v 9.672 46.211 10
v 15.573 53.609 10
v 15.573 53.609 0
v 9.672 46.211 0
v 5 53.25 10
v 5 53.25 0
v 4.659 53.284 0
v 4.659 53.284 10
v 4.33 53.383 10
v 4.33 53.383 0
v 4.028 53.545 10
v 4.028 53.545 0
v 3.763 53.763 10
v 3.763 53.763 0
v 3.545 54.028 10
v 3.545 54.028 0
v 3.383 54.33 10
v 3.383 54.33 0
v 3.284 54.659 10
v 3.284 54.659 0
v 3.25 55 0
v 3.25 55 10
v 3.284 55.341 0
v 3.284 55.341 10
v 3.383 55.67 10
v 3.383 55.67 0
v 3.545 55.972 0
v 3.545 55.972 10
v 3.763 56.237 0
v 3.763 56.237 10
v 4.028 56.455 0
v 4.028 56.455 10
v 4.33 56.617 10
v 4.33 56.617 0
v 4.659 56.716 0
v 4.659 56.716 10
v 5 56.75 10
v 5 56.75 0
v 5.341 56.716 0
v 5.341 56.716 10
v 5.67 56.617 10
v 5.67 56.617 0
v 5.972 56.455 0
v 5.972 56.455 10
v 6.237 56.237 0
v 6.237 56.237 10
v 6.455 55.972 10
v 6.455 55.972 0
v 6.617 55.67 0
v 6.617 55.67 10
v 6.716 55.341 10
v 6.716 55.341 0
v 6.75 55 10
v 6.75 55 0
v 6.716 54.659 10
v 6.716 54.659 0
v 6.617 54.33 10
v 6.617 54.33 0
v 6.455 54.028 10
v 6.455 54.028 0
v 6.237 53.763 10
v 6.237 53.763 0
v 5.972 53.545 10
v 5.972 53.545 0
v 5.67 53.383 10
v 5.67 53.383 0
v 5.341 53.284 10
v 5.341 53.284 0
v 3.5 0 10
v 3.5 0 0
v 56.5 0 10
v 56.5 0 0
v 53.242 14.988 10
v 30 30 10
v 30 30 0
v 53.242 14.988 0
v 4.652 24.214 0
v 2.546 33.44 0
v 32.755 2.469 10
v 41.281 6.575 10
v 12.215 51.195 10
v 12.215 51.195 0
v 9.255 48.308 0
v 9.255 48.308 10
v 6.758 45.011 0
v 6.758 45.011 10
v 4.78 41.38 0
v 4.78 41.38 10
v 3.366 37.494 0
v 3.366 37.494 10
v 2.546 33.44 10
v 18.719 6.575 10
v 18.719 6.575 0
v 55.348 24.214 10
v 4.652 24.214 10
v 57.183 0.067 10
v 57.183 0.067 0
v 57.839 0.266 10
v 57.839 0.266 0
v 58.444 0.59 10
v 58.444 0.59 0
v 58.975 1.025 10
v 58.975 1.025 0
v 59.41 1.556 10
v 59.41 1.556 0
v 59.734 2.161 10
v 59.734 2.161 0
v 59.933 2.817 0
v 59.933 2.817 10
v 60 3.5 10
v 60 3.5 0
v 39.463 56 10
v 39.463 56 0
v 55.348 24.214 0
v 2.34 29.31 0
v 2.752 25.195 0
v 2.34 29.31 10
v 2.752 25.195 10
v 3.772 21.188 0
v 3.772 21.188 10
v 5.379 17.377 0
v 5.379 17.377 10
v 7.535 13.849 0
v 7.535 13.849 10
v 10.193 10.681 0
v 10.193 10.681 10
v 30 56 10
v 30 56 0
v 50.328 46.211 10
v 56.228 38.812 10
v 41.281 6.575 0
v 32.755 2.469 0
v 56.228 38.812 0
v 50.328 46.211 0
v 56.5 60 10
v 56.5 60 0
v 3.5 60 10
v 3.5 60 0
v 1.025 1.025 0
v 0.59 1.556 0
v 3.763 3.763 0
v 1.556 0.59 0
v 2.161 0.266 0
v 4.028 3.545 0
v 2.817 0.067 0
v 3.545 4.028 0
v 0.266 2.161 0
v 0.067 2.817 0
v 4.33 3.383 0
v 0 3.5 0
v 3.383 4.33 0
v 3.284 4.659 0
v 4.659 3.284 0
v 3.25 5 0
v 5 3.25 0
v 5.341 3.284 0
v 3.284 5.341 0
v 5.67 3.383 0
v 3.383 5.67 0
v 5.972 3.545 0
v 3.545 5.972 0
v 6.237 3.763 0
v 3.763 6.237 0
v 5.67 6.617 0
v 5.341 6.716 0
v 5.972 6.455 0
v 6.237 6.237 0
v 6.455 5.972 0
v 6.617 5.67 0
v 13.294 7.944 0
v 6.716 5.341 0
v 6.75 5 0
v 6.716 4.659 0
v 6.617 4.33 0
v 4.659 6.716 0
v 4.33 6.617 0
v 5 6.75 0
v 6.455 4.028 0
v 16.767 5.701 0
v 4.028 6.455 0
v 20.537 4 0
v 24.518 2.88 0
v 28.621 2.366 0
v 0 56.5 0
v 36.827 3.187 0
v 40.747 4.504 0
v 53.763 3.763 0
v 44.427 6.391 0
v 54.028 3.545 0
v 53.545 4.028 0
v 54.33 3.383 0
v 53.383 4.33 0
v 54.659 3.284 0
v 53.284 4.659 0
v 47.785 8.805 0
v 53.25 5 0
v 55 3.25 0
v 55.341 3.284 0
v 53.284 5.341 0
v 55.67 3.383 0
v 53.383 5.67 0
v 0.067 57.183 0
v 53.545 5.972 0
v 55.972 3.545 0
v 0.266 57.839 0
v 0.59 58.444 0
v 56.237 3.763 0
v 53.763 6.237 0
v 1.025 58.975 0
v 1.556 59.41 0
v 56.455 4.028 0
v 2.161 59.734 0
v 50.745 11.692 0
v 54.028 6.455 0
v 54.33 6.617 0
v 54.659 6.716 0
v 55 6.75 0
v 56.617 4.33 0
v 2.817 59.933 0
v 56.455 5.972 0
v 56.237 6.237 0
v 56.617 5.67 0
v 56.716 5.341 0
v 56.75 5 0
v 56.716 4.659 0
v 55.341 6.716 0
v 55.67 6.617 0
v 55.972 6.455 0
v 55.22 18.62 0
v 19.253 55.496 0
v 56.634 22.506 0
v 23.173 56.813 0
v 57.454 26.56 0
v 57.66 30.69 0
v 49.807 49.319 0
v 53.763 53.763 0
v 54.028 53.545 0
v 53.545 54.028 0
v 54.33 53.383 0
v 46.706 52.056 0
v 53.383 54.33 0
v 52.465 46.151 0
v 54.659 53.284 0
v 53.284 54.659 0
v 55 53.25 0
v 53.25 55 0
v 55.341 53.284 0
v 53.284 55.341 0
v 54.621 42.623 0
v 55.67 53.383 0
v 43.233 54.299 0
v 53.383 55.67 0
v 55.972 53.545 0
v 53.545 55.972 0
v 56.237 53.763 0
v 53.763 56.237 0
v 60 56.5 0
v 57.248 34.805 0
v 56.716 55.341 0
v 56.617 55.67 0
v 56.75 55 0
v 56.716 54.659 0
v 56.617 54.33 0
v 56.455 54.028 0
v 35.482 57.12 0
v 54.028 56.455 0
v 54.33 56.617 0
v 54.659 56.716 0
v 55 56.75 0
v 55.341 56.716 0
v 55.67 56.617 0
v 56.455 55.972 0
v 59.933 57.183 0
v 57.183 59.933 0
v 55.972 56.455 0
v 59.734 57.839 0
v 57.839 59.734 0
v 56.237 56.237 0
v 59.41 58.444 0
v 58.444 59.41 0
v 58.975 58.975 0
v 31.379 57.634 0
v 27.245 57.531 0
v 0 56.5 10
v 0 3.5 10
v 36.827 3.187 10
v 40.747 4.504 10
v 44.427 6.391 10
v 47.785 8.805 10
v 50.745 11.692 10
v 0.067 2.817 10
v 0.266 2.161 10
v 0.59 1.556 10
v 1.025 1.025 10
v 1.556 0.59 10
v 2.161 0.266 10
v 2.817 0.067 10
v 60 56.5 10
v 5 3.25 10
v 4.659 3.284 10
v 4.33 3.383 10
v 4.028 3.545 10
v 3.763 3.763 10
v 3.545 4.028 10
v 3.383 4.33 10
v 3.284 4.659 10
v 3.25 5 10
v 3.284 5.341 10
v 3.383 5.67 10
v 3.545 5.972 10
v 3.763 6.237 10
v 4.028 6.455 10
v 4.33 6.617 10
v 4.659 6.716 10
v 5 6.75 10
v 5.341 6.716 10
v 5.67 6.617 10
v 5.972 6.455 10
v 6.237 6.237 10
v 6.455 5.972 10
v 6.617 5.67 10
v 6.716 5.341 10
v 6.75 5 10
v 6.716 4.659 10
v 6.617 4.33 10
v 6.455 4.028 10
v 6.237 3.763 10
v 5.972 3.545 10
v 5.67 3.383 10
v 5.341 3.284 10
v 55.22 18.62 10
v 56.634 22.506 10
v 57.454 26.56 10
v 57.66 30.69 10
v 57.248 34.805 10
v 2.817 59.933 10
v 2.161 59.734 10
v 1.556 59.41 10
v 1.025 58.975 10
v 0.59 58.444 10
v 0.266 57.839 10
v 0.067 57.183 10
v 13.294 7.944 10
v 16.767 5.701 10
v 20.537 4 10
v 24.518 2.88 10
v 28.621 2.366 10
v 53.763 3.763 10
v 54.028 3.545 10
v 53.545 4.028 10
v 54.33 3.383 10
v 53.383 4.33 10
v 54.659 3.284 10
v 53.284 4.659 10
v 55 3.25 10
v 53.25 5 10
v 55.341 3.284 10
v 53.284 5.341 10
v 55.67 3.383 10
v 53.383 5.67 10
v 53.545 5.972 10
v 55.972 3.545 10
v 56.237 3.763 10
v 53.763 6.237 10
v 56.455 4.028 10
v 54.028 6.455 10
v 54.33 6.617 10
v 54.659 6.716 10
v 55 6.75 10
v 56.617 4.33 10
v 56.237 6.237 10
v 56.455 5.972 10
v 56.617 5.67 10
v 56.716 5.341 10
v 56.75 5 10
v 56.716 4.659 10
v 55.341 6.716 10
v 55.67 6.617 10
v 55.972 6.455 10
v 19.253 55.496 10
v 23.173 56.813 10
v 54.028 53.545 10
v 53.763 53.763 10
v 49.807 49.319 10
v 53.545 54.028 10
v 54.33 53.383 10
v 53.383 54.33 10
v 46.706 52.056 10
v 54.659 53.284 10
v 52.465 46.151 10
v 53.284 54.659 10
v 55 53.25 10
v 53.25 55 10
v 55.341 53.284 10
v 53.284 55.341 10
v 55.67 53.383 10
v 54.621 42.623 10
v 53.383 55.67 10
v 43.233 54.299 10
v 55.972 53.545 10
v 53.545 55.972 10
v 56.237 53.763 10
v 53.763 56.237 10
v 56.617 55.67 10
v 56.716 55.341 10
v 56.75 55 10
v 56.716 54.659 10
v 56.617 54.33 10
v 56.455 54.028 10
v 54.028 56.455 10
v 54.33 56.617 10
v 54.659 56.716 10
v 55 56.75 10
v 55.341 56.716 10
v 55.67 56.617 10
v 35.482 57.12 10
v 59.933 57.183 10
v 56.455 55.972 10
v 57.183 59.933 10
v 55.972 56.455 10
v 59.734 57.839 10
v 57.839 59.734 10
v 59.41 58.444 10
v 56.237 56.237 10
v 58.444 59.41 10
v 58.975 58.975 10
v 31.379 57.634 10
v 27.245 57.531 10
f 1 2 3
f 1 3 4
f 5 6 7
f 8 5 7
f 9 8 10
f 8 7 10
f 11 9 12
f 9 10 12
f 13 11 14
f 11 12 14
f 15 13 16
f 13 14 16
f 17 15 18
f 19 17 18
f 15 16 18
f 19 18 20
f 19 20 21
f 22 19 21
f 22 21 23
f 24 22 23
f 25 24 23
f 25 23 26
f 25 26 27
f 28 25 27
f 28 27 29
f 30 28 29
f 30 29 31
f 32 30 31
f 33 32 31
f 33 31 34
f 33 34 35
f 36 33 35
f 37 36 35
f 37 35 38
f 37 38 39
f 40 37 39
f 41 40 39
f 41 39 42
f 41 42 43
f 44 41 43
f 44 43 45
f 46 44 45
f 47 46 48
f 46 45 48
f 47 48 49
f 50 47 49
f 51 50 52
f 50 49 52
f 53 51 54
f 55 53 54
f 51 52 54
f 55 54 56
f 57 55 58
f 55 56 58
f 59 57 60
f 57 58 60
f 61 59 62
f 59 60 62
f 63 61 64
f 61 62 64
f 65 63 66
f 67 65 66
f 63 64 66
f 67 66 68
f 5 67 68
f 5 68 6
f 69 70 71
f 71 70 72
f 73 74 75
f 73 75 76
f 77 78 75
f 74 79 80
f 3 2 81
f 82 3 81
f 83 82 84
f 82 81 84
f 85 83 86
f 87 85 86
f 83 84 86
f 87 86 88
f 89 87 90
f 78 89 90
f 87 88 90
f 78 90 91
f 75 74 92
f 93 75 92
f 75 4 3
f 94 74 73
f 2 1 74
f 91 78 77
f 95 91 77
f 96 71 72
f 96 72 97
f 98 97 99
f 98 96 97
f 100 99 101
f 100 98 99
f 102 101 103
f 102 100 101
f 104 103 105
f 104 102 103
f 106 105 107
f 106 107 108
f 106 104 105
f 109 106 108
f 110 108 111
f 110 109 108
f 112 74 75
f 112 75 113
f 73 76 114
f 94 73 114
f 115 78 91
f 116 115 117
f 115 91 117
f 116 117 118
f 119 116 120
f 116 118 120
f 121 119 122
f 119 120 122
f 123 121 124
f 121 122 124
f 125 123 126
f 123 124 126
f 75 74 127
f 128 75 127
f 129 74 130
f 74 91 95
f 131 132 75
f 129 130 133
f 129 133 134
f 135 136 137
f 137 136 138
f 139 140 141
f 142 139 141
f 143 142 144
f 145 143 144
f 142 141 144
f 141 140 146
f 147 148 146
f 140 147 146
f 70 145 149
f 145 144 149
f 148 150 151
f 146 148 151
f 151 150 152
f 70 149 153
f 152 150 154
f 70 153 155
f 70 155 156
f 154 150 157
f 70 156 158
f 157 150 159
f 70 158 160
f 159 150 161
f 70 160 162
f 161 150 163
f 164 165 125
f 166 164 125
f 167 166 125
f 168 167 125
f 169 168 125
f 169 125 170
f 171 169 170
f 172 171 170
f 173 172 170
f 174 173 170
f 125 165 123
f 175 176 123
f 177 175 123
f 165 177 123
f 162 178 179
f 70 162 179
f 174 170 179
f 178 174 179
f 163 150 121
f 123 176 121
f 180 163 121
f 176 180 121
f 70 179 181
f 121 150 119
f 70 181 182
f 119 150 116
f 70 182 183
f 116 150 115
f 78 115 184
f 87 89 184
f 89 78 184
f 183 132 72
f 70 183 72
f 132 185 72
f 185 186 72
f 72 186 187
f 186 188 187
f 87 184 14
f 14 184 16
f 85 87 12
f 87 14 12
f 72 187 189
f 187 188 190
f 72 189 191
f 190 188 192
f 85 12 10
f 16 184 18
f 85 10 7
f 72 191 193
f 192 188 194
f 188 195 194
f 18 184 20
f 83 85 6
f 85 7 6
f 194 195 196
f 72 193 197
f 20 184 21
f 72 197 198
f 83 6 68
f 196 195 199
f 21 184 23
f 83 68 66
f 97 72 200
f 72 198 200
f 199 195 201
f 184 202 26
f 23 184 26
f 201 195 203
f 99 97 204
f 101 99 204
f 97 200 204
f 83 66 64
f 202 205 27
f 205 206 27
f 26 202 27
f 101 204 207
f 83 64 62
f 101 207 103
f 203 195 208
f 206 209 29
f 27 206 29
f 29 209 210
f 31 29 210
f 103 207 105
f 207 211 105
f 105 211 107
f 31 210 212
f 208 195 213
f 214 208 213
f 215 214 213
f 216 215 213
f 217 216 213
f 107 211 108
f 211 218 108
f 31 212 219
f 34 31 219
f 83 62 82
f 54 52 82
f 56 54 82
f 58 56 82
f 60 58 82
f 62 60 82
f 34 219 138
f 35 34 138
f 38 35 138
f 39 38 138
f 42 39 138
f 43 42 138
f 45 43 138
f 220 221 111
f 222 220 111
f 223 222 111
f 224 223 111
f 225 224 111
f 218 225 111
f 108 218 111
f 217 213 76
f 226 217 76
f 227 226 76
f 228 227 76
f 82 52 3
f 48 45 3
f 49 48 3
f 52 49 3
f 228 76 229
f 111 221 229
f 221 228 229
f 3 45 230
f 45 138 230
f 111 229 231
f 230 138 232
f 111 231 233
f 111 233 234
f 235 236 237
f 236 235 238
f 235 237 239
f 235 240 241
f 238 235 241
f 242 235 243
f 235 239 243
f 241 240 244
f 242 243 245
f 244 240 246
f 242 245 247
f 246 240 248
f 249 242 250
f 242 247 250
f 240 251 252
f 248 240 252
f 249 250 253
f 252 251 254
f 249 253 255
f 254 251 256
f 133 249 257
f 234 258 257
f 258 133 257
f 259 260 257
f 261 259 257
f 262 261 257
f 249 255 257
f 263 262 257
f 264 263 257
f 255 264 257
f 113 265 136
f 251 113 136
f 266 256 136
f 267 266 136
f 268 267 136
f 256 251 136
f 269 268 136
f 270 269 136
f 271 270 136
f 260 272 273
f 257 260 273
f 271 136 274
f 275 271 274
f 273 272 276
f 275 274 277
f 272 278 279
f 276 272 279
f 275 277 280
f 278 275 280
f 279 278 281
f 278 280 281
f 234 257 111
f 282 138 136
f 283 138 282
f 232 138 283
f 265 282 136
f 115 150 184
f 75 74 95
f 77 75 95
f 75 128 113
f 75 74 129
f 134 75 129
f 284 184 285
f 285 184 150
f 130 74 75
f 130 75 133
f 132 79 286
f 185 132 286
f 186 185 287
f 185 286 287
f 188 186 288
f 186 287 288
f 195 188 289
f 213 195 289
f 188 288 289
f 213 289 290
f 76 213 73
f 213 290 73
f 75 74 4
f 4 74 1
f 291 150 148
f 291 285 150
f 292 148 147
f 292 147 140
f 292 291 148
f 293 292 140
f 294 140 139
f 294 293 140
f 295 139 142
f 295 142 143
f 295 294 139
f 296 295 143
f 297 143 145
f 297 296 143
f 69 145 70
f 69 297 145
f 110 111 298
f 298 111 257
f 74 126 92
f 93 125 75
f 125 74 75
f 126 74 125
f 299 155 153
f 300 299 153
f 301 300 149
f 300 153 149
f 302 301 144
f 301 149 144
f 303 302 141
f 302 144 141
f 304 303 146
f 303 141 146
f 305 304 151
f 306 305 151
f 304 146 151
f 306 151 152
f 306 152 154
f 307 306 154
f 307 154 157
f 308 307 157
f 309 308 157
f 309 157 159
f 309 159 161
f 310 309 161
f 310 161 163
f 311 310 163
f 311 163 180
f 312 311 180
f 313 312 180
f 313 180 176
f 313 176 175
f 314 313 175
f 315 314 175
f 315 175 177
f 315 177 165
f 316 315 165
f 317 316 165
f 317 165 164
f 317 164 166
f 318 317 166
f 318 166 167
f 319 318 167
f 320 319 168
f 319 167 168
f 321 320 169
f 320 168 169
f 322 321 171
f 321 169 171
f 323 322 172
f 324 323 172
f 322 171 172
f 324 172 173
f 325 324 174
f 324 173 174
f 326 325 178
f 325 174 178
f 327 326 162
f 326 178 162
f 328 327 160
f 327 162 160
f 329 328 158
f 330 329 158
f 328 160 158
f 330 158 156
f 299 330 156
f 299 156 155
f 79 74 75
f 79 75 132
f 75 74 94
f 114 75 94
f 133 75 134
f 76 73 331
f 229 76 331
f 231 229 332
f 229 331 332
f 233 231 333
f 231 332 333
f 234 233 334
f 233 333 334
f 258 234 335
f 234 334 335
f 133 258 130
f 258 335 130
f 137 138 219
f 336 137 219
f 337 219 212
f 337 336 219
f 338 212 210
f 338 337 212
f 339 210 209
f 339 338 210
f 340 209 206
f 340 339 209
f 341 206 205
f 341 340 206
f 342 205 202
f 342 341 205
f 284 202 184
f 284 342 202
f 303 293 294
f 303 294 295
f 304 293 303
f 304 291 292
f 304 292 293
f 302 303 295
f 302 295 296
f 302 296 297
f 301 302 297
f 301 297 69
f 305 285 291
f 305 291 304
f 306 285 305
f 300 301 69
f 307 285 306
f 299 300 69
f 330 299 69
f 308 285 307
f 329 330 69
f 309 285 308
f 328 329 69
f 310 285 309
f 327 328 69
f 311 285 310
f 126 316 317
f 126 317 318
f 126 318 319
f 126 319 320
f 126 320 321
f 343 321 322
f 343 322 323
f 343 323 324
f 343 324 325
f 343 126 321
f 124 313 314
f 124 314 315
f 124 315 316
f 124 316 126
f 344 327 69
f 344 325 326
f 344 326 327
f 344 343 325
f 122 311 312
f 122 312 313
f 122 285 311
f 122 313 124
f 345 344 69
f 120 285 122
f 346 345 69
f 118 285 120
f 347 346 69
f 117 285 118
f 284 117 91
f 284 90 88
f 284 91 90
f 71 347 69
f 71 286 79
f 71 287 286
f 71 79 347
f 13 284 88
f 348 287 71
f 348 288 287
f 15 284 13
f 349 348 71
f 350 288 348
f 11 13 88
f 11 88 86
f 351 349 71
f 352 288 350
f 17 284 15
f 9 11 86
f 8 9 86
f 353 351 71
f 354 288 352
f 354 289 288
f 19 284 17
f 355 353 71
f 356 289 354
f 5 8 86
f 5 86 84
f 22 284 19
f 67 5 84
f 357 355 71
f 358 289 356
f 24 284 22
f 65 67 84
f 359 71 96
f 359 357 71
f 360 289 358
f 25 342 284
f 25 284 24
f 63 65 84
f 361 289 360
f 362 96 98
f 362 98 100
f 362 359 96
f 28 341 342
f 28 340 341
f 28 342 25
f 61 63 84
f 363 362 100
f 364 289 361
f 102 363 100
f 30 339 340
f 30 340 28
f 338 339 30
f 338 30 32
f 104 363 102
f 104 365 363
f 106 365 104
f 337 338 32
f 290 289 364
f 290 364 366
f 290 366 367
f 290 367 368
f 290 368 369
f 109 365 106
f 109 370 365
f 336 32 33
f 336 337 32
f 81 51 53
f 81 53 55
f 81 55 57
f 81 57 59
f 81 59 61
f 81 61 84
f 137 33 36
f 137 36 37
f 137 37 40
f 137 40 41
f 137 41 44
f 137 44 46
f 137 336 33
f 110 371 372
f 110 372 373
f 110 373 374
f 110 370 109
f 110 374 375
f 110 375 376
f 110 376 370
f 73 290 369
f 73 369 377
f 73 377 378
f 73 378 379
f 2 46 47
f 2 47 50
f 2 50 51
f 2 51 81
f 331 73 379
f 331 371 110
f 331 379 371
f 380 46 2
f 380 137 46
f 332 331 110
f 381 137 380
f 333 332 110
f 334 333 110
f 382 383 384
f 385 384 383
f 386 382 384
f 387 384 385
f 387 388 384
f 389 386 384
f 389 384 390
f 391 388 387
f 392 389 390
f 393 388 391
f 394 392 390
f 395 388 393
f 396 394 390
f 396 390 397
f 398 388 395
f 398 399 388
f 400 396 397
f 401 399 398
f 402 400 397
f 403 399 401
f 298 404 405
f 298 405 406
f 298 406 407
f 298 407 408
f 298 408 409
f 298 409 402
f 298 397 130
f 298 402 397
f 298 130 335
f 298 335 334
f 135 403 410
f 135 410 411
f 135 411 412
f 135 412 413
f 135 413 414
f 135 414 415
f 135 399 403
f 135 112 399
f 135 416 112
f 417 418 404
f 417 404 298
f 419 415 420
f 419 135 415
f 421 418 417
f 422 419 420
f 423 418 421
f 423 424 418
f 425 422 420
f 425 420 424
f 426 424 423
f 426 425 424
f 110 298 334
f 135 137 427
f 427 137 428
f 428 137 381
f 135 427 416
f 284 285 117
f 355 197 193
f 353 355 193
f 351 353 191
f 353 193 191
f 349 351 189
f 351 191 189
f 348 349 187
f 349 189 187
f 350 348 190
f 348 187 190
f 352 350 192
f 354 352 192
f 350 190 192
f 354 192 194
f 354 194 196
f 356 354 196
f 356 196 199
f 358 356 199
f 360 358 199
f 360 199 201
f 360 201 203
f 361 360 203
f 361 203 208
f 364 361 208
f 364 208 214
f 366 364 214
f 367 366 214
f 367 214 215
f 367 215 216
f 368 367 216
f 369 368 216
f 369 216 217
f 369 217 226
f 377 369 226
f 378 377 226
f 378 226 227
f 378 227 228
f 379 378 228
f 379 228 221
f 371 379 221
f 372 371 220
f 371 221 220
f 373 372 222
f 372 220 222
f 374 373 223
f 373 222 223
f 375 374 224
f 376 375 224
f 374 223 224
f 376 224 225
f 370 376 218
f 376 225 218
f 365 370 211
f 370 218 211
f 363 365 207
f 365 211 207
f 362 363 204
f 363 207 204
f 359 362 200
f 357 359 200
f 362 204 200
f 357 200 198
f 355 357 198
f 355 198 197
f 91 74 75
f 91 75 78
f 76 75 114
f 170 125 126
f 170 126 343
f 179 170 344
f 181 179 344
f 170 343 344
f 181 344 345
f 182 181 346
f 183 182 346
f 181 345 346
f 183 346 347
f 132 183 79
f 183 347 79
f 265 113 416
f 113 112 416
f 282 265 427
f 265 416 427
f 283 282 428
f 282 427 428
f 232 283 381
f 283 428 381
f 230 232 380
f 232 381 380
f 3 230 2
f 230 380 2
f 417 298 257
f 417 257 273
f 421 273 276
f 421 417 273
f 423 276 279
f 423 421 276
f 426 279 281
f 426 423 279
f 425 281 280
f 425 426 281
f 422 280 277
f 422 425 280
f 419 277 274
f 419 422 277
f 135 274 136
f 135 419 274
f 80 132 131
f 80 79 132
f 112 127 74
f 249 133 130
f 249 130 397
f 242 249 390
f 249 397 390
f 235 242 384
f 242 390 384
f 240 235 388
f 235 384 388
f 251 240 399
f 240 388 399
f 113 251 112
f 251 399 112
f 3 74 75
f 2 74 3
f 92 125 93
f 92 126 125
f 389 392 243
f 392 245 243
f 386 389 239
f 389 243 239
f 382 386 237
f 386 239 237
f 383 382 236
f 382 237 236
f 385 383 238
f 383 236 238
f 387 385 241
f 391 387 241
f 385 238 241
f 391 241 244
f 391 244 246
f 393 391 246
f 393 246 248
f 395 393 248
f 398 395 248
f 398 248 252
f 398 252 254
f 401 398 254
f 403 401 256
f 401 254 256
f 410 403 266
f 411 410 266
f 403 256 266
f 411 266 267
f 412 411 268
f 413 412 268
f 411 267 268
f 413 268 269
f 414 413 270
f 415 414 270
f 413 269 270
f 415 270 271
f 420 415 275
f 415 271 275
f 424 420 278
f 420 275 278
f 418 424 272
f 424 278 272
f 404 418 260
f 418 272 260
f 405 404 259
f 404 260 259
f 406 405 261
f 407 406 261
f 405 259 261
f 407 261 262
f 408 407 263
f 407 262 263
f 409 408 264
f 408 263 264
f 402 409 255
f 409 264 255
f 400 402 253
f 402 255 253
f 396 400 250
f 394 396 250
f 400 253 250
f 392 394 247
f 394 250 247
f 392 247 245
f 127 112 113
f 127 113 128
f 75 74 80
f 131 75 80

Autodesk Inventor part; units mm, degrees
ref_plane "YZ Plane" through (0, 0, 0) normal (1, 0, 0) x (0, 1, 0)
ref_plane "XZ Plane" through (0, 0, 0) normal (0, 1, 0) x (-1, 0, 0)
ref_plane "XY Plane" through (0, 0, 0) normal (0, 0, 1) x (1, 0, 0)
sketch "Sketch1" plane through (0, 0, 0) normal (0, 0, 1) x (1, 0, 0)
  line L0 (0, 0) -> (60, 0)
  line L1 (60, 0) -> (60, 60)
  line L2 (60, 60) -> (0, 60)
  line L3 (0, 60) -> (0, 0)
  dimension "d0" = 60
  dimension "d1" = 60
extrude "Extrusion1" add sketch "Sketch1" along normal blind 10
hole "Hole1" at (5, 55, 10) direction (0, 0, -1) diameter 3.5 end through all
hole "Hole2" at (5, 5, 10) direction (0, 0, -1) diameter 3.5 end through all
hole "Hole3" at (55, 5, 10) direction (0, 0, -1) diameter 3.5 end through all
hole "Hole4" at (55, 55, 10) direction (0, 0, -1) diameter 3.5 end through all
fillet "Fillet1" radius 3.5 4 edges at (60, 0, 5) (0, 0, 5) (0, 60, 5) (60, 60, 5)
sketch "Sketch2" plane through (0, 0, 10) normal (0, 0, 1) x (1, 0, 0)
  line L0 (56.5, 60) -> (3.5, 60) projected
  line L1 (0, 56.5) -> (0, 3.5) projected
  line L2 (3.5, 0) -> (56.5, 0) projected
  line L3 (60, 3.5) -> (60, 56.5) projected
  line L4 (30, 60) -> (30, 0) construction
  line L5 (0, 30) -> (60, 30) construction
  line L6 (30, 30) -> (30, 56)
  line L7 (30, 30) -> (39.4632, 56)
  line L8 (39.4632, 56) -> (30, 56)
  line L9 (30, 30) -> (9.6724, 46.2107)
  line L10 (30, 30) -> (15.5726, 53.6094)
  line L11 (15.5726, 53.6094) -> (9.6724, 46.2107)
  line L12 (30, 30) -> (4.6519, 24.2145)
  line L13 (30, 30) -> (2.5461, 33.4404)
  line L14 (2.5461, 33.4404) -> (4.6519, 24.2145)
  line L15 (30, 30) -> (18.719, 6.5748)
  line L16 (30, 30) -> (10.193, 10.6807)
  line L17 (10.193, 10.6807) -> (18.719, 6.5748)
  line L18 (30, 30) -> (41.281, 6.5748)
  line L19 (30, 30) -> (32.7549, 2.4689)
  line L20 (32.7549, 2.4689) -> (41.281, 6.5748)
  line L21 (30, 30) -> (55.3481, 24.2145)
  line L22 (30, 30) -> (53.2424, 14.9885)
  line L23 (53.2424, 14.9885) -> (55.3481, 24.2145)
  line L24 (30, 30) -> (50.3276, 46.2107)
  line L25 (30, 30) -> (56.2278, 38.8121)
  line L26 (56.2278, 38.8121) -> (50.3276, 46.2107)
  circle A0 centre (30, 30) radius 27.6686
  point P0 (0, 0)
  dimension "d41" = 26
  dimension "d42" = 20
  dimension "d45" = 360
extrude "Extrusion2" cut sketch "Sketch2" against normal blind 10 contours L10 A0 L8 L6 | L13 A0 L11 L9 | L16 A0 L14 L12 | L19 A0 L17 L15 | L22 A0 L20 L18 | L25 A0 L23 L21 | L7 A0 L26 L24
properties part number "Fan60mm" material "ABS Plastic"
